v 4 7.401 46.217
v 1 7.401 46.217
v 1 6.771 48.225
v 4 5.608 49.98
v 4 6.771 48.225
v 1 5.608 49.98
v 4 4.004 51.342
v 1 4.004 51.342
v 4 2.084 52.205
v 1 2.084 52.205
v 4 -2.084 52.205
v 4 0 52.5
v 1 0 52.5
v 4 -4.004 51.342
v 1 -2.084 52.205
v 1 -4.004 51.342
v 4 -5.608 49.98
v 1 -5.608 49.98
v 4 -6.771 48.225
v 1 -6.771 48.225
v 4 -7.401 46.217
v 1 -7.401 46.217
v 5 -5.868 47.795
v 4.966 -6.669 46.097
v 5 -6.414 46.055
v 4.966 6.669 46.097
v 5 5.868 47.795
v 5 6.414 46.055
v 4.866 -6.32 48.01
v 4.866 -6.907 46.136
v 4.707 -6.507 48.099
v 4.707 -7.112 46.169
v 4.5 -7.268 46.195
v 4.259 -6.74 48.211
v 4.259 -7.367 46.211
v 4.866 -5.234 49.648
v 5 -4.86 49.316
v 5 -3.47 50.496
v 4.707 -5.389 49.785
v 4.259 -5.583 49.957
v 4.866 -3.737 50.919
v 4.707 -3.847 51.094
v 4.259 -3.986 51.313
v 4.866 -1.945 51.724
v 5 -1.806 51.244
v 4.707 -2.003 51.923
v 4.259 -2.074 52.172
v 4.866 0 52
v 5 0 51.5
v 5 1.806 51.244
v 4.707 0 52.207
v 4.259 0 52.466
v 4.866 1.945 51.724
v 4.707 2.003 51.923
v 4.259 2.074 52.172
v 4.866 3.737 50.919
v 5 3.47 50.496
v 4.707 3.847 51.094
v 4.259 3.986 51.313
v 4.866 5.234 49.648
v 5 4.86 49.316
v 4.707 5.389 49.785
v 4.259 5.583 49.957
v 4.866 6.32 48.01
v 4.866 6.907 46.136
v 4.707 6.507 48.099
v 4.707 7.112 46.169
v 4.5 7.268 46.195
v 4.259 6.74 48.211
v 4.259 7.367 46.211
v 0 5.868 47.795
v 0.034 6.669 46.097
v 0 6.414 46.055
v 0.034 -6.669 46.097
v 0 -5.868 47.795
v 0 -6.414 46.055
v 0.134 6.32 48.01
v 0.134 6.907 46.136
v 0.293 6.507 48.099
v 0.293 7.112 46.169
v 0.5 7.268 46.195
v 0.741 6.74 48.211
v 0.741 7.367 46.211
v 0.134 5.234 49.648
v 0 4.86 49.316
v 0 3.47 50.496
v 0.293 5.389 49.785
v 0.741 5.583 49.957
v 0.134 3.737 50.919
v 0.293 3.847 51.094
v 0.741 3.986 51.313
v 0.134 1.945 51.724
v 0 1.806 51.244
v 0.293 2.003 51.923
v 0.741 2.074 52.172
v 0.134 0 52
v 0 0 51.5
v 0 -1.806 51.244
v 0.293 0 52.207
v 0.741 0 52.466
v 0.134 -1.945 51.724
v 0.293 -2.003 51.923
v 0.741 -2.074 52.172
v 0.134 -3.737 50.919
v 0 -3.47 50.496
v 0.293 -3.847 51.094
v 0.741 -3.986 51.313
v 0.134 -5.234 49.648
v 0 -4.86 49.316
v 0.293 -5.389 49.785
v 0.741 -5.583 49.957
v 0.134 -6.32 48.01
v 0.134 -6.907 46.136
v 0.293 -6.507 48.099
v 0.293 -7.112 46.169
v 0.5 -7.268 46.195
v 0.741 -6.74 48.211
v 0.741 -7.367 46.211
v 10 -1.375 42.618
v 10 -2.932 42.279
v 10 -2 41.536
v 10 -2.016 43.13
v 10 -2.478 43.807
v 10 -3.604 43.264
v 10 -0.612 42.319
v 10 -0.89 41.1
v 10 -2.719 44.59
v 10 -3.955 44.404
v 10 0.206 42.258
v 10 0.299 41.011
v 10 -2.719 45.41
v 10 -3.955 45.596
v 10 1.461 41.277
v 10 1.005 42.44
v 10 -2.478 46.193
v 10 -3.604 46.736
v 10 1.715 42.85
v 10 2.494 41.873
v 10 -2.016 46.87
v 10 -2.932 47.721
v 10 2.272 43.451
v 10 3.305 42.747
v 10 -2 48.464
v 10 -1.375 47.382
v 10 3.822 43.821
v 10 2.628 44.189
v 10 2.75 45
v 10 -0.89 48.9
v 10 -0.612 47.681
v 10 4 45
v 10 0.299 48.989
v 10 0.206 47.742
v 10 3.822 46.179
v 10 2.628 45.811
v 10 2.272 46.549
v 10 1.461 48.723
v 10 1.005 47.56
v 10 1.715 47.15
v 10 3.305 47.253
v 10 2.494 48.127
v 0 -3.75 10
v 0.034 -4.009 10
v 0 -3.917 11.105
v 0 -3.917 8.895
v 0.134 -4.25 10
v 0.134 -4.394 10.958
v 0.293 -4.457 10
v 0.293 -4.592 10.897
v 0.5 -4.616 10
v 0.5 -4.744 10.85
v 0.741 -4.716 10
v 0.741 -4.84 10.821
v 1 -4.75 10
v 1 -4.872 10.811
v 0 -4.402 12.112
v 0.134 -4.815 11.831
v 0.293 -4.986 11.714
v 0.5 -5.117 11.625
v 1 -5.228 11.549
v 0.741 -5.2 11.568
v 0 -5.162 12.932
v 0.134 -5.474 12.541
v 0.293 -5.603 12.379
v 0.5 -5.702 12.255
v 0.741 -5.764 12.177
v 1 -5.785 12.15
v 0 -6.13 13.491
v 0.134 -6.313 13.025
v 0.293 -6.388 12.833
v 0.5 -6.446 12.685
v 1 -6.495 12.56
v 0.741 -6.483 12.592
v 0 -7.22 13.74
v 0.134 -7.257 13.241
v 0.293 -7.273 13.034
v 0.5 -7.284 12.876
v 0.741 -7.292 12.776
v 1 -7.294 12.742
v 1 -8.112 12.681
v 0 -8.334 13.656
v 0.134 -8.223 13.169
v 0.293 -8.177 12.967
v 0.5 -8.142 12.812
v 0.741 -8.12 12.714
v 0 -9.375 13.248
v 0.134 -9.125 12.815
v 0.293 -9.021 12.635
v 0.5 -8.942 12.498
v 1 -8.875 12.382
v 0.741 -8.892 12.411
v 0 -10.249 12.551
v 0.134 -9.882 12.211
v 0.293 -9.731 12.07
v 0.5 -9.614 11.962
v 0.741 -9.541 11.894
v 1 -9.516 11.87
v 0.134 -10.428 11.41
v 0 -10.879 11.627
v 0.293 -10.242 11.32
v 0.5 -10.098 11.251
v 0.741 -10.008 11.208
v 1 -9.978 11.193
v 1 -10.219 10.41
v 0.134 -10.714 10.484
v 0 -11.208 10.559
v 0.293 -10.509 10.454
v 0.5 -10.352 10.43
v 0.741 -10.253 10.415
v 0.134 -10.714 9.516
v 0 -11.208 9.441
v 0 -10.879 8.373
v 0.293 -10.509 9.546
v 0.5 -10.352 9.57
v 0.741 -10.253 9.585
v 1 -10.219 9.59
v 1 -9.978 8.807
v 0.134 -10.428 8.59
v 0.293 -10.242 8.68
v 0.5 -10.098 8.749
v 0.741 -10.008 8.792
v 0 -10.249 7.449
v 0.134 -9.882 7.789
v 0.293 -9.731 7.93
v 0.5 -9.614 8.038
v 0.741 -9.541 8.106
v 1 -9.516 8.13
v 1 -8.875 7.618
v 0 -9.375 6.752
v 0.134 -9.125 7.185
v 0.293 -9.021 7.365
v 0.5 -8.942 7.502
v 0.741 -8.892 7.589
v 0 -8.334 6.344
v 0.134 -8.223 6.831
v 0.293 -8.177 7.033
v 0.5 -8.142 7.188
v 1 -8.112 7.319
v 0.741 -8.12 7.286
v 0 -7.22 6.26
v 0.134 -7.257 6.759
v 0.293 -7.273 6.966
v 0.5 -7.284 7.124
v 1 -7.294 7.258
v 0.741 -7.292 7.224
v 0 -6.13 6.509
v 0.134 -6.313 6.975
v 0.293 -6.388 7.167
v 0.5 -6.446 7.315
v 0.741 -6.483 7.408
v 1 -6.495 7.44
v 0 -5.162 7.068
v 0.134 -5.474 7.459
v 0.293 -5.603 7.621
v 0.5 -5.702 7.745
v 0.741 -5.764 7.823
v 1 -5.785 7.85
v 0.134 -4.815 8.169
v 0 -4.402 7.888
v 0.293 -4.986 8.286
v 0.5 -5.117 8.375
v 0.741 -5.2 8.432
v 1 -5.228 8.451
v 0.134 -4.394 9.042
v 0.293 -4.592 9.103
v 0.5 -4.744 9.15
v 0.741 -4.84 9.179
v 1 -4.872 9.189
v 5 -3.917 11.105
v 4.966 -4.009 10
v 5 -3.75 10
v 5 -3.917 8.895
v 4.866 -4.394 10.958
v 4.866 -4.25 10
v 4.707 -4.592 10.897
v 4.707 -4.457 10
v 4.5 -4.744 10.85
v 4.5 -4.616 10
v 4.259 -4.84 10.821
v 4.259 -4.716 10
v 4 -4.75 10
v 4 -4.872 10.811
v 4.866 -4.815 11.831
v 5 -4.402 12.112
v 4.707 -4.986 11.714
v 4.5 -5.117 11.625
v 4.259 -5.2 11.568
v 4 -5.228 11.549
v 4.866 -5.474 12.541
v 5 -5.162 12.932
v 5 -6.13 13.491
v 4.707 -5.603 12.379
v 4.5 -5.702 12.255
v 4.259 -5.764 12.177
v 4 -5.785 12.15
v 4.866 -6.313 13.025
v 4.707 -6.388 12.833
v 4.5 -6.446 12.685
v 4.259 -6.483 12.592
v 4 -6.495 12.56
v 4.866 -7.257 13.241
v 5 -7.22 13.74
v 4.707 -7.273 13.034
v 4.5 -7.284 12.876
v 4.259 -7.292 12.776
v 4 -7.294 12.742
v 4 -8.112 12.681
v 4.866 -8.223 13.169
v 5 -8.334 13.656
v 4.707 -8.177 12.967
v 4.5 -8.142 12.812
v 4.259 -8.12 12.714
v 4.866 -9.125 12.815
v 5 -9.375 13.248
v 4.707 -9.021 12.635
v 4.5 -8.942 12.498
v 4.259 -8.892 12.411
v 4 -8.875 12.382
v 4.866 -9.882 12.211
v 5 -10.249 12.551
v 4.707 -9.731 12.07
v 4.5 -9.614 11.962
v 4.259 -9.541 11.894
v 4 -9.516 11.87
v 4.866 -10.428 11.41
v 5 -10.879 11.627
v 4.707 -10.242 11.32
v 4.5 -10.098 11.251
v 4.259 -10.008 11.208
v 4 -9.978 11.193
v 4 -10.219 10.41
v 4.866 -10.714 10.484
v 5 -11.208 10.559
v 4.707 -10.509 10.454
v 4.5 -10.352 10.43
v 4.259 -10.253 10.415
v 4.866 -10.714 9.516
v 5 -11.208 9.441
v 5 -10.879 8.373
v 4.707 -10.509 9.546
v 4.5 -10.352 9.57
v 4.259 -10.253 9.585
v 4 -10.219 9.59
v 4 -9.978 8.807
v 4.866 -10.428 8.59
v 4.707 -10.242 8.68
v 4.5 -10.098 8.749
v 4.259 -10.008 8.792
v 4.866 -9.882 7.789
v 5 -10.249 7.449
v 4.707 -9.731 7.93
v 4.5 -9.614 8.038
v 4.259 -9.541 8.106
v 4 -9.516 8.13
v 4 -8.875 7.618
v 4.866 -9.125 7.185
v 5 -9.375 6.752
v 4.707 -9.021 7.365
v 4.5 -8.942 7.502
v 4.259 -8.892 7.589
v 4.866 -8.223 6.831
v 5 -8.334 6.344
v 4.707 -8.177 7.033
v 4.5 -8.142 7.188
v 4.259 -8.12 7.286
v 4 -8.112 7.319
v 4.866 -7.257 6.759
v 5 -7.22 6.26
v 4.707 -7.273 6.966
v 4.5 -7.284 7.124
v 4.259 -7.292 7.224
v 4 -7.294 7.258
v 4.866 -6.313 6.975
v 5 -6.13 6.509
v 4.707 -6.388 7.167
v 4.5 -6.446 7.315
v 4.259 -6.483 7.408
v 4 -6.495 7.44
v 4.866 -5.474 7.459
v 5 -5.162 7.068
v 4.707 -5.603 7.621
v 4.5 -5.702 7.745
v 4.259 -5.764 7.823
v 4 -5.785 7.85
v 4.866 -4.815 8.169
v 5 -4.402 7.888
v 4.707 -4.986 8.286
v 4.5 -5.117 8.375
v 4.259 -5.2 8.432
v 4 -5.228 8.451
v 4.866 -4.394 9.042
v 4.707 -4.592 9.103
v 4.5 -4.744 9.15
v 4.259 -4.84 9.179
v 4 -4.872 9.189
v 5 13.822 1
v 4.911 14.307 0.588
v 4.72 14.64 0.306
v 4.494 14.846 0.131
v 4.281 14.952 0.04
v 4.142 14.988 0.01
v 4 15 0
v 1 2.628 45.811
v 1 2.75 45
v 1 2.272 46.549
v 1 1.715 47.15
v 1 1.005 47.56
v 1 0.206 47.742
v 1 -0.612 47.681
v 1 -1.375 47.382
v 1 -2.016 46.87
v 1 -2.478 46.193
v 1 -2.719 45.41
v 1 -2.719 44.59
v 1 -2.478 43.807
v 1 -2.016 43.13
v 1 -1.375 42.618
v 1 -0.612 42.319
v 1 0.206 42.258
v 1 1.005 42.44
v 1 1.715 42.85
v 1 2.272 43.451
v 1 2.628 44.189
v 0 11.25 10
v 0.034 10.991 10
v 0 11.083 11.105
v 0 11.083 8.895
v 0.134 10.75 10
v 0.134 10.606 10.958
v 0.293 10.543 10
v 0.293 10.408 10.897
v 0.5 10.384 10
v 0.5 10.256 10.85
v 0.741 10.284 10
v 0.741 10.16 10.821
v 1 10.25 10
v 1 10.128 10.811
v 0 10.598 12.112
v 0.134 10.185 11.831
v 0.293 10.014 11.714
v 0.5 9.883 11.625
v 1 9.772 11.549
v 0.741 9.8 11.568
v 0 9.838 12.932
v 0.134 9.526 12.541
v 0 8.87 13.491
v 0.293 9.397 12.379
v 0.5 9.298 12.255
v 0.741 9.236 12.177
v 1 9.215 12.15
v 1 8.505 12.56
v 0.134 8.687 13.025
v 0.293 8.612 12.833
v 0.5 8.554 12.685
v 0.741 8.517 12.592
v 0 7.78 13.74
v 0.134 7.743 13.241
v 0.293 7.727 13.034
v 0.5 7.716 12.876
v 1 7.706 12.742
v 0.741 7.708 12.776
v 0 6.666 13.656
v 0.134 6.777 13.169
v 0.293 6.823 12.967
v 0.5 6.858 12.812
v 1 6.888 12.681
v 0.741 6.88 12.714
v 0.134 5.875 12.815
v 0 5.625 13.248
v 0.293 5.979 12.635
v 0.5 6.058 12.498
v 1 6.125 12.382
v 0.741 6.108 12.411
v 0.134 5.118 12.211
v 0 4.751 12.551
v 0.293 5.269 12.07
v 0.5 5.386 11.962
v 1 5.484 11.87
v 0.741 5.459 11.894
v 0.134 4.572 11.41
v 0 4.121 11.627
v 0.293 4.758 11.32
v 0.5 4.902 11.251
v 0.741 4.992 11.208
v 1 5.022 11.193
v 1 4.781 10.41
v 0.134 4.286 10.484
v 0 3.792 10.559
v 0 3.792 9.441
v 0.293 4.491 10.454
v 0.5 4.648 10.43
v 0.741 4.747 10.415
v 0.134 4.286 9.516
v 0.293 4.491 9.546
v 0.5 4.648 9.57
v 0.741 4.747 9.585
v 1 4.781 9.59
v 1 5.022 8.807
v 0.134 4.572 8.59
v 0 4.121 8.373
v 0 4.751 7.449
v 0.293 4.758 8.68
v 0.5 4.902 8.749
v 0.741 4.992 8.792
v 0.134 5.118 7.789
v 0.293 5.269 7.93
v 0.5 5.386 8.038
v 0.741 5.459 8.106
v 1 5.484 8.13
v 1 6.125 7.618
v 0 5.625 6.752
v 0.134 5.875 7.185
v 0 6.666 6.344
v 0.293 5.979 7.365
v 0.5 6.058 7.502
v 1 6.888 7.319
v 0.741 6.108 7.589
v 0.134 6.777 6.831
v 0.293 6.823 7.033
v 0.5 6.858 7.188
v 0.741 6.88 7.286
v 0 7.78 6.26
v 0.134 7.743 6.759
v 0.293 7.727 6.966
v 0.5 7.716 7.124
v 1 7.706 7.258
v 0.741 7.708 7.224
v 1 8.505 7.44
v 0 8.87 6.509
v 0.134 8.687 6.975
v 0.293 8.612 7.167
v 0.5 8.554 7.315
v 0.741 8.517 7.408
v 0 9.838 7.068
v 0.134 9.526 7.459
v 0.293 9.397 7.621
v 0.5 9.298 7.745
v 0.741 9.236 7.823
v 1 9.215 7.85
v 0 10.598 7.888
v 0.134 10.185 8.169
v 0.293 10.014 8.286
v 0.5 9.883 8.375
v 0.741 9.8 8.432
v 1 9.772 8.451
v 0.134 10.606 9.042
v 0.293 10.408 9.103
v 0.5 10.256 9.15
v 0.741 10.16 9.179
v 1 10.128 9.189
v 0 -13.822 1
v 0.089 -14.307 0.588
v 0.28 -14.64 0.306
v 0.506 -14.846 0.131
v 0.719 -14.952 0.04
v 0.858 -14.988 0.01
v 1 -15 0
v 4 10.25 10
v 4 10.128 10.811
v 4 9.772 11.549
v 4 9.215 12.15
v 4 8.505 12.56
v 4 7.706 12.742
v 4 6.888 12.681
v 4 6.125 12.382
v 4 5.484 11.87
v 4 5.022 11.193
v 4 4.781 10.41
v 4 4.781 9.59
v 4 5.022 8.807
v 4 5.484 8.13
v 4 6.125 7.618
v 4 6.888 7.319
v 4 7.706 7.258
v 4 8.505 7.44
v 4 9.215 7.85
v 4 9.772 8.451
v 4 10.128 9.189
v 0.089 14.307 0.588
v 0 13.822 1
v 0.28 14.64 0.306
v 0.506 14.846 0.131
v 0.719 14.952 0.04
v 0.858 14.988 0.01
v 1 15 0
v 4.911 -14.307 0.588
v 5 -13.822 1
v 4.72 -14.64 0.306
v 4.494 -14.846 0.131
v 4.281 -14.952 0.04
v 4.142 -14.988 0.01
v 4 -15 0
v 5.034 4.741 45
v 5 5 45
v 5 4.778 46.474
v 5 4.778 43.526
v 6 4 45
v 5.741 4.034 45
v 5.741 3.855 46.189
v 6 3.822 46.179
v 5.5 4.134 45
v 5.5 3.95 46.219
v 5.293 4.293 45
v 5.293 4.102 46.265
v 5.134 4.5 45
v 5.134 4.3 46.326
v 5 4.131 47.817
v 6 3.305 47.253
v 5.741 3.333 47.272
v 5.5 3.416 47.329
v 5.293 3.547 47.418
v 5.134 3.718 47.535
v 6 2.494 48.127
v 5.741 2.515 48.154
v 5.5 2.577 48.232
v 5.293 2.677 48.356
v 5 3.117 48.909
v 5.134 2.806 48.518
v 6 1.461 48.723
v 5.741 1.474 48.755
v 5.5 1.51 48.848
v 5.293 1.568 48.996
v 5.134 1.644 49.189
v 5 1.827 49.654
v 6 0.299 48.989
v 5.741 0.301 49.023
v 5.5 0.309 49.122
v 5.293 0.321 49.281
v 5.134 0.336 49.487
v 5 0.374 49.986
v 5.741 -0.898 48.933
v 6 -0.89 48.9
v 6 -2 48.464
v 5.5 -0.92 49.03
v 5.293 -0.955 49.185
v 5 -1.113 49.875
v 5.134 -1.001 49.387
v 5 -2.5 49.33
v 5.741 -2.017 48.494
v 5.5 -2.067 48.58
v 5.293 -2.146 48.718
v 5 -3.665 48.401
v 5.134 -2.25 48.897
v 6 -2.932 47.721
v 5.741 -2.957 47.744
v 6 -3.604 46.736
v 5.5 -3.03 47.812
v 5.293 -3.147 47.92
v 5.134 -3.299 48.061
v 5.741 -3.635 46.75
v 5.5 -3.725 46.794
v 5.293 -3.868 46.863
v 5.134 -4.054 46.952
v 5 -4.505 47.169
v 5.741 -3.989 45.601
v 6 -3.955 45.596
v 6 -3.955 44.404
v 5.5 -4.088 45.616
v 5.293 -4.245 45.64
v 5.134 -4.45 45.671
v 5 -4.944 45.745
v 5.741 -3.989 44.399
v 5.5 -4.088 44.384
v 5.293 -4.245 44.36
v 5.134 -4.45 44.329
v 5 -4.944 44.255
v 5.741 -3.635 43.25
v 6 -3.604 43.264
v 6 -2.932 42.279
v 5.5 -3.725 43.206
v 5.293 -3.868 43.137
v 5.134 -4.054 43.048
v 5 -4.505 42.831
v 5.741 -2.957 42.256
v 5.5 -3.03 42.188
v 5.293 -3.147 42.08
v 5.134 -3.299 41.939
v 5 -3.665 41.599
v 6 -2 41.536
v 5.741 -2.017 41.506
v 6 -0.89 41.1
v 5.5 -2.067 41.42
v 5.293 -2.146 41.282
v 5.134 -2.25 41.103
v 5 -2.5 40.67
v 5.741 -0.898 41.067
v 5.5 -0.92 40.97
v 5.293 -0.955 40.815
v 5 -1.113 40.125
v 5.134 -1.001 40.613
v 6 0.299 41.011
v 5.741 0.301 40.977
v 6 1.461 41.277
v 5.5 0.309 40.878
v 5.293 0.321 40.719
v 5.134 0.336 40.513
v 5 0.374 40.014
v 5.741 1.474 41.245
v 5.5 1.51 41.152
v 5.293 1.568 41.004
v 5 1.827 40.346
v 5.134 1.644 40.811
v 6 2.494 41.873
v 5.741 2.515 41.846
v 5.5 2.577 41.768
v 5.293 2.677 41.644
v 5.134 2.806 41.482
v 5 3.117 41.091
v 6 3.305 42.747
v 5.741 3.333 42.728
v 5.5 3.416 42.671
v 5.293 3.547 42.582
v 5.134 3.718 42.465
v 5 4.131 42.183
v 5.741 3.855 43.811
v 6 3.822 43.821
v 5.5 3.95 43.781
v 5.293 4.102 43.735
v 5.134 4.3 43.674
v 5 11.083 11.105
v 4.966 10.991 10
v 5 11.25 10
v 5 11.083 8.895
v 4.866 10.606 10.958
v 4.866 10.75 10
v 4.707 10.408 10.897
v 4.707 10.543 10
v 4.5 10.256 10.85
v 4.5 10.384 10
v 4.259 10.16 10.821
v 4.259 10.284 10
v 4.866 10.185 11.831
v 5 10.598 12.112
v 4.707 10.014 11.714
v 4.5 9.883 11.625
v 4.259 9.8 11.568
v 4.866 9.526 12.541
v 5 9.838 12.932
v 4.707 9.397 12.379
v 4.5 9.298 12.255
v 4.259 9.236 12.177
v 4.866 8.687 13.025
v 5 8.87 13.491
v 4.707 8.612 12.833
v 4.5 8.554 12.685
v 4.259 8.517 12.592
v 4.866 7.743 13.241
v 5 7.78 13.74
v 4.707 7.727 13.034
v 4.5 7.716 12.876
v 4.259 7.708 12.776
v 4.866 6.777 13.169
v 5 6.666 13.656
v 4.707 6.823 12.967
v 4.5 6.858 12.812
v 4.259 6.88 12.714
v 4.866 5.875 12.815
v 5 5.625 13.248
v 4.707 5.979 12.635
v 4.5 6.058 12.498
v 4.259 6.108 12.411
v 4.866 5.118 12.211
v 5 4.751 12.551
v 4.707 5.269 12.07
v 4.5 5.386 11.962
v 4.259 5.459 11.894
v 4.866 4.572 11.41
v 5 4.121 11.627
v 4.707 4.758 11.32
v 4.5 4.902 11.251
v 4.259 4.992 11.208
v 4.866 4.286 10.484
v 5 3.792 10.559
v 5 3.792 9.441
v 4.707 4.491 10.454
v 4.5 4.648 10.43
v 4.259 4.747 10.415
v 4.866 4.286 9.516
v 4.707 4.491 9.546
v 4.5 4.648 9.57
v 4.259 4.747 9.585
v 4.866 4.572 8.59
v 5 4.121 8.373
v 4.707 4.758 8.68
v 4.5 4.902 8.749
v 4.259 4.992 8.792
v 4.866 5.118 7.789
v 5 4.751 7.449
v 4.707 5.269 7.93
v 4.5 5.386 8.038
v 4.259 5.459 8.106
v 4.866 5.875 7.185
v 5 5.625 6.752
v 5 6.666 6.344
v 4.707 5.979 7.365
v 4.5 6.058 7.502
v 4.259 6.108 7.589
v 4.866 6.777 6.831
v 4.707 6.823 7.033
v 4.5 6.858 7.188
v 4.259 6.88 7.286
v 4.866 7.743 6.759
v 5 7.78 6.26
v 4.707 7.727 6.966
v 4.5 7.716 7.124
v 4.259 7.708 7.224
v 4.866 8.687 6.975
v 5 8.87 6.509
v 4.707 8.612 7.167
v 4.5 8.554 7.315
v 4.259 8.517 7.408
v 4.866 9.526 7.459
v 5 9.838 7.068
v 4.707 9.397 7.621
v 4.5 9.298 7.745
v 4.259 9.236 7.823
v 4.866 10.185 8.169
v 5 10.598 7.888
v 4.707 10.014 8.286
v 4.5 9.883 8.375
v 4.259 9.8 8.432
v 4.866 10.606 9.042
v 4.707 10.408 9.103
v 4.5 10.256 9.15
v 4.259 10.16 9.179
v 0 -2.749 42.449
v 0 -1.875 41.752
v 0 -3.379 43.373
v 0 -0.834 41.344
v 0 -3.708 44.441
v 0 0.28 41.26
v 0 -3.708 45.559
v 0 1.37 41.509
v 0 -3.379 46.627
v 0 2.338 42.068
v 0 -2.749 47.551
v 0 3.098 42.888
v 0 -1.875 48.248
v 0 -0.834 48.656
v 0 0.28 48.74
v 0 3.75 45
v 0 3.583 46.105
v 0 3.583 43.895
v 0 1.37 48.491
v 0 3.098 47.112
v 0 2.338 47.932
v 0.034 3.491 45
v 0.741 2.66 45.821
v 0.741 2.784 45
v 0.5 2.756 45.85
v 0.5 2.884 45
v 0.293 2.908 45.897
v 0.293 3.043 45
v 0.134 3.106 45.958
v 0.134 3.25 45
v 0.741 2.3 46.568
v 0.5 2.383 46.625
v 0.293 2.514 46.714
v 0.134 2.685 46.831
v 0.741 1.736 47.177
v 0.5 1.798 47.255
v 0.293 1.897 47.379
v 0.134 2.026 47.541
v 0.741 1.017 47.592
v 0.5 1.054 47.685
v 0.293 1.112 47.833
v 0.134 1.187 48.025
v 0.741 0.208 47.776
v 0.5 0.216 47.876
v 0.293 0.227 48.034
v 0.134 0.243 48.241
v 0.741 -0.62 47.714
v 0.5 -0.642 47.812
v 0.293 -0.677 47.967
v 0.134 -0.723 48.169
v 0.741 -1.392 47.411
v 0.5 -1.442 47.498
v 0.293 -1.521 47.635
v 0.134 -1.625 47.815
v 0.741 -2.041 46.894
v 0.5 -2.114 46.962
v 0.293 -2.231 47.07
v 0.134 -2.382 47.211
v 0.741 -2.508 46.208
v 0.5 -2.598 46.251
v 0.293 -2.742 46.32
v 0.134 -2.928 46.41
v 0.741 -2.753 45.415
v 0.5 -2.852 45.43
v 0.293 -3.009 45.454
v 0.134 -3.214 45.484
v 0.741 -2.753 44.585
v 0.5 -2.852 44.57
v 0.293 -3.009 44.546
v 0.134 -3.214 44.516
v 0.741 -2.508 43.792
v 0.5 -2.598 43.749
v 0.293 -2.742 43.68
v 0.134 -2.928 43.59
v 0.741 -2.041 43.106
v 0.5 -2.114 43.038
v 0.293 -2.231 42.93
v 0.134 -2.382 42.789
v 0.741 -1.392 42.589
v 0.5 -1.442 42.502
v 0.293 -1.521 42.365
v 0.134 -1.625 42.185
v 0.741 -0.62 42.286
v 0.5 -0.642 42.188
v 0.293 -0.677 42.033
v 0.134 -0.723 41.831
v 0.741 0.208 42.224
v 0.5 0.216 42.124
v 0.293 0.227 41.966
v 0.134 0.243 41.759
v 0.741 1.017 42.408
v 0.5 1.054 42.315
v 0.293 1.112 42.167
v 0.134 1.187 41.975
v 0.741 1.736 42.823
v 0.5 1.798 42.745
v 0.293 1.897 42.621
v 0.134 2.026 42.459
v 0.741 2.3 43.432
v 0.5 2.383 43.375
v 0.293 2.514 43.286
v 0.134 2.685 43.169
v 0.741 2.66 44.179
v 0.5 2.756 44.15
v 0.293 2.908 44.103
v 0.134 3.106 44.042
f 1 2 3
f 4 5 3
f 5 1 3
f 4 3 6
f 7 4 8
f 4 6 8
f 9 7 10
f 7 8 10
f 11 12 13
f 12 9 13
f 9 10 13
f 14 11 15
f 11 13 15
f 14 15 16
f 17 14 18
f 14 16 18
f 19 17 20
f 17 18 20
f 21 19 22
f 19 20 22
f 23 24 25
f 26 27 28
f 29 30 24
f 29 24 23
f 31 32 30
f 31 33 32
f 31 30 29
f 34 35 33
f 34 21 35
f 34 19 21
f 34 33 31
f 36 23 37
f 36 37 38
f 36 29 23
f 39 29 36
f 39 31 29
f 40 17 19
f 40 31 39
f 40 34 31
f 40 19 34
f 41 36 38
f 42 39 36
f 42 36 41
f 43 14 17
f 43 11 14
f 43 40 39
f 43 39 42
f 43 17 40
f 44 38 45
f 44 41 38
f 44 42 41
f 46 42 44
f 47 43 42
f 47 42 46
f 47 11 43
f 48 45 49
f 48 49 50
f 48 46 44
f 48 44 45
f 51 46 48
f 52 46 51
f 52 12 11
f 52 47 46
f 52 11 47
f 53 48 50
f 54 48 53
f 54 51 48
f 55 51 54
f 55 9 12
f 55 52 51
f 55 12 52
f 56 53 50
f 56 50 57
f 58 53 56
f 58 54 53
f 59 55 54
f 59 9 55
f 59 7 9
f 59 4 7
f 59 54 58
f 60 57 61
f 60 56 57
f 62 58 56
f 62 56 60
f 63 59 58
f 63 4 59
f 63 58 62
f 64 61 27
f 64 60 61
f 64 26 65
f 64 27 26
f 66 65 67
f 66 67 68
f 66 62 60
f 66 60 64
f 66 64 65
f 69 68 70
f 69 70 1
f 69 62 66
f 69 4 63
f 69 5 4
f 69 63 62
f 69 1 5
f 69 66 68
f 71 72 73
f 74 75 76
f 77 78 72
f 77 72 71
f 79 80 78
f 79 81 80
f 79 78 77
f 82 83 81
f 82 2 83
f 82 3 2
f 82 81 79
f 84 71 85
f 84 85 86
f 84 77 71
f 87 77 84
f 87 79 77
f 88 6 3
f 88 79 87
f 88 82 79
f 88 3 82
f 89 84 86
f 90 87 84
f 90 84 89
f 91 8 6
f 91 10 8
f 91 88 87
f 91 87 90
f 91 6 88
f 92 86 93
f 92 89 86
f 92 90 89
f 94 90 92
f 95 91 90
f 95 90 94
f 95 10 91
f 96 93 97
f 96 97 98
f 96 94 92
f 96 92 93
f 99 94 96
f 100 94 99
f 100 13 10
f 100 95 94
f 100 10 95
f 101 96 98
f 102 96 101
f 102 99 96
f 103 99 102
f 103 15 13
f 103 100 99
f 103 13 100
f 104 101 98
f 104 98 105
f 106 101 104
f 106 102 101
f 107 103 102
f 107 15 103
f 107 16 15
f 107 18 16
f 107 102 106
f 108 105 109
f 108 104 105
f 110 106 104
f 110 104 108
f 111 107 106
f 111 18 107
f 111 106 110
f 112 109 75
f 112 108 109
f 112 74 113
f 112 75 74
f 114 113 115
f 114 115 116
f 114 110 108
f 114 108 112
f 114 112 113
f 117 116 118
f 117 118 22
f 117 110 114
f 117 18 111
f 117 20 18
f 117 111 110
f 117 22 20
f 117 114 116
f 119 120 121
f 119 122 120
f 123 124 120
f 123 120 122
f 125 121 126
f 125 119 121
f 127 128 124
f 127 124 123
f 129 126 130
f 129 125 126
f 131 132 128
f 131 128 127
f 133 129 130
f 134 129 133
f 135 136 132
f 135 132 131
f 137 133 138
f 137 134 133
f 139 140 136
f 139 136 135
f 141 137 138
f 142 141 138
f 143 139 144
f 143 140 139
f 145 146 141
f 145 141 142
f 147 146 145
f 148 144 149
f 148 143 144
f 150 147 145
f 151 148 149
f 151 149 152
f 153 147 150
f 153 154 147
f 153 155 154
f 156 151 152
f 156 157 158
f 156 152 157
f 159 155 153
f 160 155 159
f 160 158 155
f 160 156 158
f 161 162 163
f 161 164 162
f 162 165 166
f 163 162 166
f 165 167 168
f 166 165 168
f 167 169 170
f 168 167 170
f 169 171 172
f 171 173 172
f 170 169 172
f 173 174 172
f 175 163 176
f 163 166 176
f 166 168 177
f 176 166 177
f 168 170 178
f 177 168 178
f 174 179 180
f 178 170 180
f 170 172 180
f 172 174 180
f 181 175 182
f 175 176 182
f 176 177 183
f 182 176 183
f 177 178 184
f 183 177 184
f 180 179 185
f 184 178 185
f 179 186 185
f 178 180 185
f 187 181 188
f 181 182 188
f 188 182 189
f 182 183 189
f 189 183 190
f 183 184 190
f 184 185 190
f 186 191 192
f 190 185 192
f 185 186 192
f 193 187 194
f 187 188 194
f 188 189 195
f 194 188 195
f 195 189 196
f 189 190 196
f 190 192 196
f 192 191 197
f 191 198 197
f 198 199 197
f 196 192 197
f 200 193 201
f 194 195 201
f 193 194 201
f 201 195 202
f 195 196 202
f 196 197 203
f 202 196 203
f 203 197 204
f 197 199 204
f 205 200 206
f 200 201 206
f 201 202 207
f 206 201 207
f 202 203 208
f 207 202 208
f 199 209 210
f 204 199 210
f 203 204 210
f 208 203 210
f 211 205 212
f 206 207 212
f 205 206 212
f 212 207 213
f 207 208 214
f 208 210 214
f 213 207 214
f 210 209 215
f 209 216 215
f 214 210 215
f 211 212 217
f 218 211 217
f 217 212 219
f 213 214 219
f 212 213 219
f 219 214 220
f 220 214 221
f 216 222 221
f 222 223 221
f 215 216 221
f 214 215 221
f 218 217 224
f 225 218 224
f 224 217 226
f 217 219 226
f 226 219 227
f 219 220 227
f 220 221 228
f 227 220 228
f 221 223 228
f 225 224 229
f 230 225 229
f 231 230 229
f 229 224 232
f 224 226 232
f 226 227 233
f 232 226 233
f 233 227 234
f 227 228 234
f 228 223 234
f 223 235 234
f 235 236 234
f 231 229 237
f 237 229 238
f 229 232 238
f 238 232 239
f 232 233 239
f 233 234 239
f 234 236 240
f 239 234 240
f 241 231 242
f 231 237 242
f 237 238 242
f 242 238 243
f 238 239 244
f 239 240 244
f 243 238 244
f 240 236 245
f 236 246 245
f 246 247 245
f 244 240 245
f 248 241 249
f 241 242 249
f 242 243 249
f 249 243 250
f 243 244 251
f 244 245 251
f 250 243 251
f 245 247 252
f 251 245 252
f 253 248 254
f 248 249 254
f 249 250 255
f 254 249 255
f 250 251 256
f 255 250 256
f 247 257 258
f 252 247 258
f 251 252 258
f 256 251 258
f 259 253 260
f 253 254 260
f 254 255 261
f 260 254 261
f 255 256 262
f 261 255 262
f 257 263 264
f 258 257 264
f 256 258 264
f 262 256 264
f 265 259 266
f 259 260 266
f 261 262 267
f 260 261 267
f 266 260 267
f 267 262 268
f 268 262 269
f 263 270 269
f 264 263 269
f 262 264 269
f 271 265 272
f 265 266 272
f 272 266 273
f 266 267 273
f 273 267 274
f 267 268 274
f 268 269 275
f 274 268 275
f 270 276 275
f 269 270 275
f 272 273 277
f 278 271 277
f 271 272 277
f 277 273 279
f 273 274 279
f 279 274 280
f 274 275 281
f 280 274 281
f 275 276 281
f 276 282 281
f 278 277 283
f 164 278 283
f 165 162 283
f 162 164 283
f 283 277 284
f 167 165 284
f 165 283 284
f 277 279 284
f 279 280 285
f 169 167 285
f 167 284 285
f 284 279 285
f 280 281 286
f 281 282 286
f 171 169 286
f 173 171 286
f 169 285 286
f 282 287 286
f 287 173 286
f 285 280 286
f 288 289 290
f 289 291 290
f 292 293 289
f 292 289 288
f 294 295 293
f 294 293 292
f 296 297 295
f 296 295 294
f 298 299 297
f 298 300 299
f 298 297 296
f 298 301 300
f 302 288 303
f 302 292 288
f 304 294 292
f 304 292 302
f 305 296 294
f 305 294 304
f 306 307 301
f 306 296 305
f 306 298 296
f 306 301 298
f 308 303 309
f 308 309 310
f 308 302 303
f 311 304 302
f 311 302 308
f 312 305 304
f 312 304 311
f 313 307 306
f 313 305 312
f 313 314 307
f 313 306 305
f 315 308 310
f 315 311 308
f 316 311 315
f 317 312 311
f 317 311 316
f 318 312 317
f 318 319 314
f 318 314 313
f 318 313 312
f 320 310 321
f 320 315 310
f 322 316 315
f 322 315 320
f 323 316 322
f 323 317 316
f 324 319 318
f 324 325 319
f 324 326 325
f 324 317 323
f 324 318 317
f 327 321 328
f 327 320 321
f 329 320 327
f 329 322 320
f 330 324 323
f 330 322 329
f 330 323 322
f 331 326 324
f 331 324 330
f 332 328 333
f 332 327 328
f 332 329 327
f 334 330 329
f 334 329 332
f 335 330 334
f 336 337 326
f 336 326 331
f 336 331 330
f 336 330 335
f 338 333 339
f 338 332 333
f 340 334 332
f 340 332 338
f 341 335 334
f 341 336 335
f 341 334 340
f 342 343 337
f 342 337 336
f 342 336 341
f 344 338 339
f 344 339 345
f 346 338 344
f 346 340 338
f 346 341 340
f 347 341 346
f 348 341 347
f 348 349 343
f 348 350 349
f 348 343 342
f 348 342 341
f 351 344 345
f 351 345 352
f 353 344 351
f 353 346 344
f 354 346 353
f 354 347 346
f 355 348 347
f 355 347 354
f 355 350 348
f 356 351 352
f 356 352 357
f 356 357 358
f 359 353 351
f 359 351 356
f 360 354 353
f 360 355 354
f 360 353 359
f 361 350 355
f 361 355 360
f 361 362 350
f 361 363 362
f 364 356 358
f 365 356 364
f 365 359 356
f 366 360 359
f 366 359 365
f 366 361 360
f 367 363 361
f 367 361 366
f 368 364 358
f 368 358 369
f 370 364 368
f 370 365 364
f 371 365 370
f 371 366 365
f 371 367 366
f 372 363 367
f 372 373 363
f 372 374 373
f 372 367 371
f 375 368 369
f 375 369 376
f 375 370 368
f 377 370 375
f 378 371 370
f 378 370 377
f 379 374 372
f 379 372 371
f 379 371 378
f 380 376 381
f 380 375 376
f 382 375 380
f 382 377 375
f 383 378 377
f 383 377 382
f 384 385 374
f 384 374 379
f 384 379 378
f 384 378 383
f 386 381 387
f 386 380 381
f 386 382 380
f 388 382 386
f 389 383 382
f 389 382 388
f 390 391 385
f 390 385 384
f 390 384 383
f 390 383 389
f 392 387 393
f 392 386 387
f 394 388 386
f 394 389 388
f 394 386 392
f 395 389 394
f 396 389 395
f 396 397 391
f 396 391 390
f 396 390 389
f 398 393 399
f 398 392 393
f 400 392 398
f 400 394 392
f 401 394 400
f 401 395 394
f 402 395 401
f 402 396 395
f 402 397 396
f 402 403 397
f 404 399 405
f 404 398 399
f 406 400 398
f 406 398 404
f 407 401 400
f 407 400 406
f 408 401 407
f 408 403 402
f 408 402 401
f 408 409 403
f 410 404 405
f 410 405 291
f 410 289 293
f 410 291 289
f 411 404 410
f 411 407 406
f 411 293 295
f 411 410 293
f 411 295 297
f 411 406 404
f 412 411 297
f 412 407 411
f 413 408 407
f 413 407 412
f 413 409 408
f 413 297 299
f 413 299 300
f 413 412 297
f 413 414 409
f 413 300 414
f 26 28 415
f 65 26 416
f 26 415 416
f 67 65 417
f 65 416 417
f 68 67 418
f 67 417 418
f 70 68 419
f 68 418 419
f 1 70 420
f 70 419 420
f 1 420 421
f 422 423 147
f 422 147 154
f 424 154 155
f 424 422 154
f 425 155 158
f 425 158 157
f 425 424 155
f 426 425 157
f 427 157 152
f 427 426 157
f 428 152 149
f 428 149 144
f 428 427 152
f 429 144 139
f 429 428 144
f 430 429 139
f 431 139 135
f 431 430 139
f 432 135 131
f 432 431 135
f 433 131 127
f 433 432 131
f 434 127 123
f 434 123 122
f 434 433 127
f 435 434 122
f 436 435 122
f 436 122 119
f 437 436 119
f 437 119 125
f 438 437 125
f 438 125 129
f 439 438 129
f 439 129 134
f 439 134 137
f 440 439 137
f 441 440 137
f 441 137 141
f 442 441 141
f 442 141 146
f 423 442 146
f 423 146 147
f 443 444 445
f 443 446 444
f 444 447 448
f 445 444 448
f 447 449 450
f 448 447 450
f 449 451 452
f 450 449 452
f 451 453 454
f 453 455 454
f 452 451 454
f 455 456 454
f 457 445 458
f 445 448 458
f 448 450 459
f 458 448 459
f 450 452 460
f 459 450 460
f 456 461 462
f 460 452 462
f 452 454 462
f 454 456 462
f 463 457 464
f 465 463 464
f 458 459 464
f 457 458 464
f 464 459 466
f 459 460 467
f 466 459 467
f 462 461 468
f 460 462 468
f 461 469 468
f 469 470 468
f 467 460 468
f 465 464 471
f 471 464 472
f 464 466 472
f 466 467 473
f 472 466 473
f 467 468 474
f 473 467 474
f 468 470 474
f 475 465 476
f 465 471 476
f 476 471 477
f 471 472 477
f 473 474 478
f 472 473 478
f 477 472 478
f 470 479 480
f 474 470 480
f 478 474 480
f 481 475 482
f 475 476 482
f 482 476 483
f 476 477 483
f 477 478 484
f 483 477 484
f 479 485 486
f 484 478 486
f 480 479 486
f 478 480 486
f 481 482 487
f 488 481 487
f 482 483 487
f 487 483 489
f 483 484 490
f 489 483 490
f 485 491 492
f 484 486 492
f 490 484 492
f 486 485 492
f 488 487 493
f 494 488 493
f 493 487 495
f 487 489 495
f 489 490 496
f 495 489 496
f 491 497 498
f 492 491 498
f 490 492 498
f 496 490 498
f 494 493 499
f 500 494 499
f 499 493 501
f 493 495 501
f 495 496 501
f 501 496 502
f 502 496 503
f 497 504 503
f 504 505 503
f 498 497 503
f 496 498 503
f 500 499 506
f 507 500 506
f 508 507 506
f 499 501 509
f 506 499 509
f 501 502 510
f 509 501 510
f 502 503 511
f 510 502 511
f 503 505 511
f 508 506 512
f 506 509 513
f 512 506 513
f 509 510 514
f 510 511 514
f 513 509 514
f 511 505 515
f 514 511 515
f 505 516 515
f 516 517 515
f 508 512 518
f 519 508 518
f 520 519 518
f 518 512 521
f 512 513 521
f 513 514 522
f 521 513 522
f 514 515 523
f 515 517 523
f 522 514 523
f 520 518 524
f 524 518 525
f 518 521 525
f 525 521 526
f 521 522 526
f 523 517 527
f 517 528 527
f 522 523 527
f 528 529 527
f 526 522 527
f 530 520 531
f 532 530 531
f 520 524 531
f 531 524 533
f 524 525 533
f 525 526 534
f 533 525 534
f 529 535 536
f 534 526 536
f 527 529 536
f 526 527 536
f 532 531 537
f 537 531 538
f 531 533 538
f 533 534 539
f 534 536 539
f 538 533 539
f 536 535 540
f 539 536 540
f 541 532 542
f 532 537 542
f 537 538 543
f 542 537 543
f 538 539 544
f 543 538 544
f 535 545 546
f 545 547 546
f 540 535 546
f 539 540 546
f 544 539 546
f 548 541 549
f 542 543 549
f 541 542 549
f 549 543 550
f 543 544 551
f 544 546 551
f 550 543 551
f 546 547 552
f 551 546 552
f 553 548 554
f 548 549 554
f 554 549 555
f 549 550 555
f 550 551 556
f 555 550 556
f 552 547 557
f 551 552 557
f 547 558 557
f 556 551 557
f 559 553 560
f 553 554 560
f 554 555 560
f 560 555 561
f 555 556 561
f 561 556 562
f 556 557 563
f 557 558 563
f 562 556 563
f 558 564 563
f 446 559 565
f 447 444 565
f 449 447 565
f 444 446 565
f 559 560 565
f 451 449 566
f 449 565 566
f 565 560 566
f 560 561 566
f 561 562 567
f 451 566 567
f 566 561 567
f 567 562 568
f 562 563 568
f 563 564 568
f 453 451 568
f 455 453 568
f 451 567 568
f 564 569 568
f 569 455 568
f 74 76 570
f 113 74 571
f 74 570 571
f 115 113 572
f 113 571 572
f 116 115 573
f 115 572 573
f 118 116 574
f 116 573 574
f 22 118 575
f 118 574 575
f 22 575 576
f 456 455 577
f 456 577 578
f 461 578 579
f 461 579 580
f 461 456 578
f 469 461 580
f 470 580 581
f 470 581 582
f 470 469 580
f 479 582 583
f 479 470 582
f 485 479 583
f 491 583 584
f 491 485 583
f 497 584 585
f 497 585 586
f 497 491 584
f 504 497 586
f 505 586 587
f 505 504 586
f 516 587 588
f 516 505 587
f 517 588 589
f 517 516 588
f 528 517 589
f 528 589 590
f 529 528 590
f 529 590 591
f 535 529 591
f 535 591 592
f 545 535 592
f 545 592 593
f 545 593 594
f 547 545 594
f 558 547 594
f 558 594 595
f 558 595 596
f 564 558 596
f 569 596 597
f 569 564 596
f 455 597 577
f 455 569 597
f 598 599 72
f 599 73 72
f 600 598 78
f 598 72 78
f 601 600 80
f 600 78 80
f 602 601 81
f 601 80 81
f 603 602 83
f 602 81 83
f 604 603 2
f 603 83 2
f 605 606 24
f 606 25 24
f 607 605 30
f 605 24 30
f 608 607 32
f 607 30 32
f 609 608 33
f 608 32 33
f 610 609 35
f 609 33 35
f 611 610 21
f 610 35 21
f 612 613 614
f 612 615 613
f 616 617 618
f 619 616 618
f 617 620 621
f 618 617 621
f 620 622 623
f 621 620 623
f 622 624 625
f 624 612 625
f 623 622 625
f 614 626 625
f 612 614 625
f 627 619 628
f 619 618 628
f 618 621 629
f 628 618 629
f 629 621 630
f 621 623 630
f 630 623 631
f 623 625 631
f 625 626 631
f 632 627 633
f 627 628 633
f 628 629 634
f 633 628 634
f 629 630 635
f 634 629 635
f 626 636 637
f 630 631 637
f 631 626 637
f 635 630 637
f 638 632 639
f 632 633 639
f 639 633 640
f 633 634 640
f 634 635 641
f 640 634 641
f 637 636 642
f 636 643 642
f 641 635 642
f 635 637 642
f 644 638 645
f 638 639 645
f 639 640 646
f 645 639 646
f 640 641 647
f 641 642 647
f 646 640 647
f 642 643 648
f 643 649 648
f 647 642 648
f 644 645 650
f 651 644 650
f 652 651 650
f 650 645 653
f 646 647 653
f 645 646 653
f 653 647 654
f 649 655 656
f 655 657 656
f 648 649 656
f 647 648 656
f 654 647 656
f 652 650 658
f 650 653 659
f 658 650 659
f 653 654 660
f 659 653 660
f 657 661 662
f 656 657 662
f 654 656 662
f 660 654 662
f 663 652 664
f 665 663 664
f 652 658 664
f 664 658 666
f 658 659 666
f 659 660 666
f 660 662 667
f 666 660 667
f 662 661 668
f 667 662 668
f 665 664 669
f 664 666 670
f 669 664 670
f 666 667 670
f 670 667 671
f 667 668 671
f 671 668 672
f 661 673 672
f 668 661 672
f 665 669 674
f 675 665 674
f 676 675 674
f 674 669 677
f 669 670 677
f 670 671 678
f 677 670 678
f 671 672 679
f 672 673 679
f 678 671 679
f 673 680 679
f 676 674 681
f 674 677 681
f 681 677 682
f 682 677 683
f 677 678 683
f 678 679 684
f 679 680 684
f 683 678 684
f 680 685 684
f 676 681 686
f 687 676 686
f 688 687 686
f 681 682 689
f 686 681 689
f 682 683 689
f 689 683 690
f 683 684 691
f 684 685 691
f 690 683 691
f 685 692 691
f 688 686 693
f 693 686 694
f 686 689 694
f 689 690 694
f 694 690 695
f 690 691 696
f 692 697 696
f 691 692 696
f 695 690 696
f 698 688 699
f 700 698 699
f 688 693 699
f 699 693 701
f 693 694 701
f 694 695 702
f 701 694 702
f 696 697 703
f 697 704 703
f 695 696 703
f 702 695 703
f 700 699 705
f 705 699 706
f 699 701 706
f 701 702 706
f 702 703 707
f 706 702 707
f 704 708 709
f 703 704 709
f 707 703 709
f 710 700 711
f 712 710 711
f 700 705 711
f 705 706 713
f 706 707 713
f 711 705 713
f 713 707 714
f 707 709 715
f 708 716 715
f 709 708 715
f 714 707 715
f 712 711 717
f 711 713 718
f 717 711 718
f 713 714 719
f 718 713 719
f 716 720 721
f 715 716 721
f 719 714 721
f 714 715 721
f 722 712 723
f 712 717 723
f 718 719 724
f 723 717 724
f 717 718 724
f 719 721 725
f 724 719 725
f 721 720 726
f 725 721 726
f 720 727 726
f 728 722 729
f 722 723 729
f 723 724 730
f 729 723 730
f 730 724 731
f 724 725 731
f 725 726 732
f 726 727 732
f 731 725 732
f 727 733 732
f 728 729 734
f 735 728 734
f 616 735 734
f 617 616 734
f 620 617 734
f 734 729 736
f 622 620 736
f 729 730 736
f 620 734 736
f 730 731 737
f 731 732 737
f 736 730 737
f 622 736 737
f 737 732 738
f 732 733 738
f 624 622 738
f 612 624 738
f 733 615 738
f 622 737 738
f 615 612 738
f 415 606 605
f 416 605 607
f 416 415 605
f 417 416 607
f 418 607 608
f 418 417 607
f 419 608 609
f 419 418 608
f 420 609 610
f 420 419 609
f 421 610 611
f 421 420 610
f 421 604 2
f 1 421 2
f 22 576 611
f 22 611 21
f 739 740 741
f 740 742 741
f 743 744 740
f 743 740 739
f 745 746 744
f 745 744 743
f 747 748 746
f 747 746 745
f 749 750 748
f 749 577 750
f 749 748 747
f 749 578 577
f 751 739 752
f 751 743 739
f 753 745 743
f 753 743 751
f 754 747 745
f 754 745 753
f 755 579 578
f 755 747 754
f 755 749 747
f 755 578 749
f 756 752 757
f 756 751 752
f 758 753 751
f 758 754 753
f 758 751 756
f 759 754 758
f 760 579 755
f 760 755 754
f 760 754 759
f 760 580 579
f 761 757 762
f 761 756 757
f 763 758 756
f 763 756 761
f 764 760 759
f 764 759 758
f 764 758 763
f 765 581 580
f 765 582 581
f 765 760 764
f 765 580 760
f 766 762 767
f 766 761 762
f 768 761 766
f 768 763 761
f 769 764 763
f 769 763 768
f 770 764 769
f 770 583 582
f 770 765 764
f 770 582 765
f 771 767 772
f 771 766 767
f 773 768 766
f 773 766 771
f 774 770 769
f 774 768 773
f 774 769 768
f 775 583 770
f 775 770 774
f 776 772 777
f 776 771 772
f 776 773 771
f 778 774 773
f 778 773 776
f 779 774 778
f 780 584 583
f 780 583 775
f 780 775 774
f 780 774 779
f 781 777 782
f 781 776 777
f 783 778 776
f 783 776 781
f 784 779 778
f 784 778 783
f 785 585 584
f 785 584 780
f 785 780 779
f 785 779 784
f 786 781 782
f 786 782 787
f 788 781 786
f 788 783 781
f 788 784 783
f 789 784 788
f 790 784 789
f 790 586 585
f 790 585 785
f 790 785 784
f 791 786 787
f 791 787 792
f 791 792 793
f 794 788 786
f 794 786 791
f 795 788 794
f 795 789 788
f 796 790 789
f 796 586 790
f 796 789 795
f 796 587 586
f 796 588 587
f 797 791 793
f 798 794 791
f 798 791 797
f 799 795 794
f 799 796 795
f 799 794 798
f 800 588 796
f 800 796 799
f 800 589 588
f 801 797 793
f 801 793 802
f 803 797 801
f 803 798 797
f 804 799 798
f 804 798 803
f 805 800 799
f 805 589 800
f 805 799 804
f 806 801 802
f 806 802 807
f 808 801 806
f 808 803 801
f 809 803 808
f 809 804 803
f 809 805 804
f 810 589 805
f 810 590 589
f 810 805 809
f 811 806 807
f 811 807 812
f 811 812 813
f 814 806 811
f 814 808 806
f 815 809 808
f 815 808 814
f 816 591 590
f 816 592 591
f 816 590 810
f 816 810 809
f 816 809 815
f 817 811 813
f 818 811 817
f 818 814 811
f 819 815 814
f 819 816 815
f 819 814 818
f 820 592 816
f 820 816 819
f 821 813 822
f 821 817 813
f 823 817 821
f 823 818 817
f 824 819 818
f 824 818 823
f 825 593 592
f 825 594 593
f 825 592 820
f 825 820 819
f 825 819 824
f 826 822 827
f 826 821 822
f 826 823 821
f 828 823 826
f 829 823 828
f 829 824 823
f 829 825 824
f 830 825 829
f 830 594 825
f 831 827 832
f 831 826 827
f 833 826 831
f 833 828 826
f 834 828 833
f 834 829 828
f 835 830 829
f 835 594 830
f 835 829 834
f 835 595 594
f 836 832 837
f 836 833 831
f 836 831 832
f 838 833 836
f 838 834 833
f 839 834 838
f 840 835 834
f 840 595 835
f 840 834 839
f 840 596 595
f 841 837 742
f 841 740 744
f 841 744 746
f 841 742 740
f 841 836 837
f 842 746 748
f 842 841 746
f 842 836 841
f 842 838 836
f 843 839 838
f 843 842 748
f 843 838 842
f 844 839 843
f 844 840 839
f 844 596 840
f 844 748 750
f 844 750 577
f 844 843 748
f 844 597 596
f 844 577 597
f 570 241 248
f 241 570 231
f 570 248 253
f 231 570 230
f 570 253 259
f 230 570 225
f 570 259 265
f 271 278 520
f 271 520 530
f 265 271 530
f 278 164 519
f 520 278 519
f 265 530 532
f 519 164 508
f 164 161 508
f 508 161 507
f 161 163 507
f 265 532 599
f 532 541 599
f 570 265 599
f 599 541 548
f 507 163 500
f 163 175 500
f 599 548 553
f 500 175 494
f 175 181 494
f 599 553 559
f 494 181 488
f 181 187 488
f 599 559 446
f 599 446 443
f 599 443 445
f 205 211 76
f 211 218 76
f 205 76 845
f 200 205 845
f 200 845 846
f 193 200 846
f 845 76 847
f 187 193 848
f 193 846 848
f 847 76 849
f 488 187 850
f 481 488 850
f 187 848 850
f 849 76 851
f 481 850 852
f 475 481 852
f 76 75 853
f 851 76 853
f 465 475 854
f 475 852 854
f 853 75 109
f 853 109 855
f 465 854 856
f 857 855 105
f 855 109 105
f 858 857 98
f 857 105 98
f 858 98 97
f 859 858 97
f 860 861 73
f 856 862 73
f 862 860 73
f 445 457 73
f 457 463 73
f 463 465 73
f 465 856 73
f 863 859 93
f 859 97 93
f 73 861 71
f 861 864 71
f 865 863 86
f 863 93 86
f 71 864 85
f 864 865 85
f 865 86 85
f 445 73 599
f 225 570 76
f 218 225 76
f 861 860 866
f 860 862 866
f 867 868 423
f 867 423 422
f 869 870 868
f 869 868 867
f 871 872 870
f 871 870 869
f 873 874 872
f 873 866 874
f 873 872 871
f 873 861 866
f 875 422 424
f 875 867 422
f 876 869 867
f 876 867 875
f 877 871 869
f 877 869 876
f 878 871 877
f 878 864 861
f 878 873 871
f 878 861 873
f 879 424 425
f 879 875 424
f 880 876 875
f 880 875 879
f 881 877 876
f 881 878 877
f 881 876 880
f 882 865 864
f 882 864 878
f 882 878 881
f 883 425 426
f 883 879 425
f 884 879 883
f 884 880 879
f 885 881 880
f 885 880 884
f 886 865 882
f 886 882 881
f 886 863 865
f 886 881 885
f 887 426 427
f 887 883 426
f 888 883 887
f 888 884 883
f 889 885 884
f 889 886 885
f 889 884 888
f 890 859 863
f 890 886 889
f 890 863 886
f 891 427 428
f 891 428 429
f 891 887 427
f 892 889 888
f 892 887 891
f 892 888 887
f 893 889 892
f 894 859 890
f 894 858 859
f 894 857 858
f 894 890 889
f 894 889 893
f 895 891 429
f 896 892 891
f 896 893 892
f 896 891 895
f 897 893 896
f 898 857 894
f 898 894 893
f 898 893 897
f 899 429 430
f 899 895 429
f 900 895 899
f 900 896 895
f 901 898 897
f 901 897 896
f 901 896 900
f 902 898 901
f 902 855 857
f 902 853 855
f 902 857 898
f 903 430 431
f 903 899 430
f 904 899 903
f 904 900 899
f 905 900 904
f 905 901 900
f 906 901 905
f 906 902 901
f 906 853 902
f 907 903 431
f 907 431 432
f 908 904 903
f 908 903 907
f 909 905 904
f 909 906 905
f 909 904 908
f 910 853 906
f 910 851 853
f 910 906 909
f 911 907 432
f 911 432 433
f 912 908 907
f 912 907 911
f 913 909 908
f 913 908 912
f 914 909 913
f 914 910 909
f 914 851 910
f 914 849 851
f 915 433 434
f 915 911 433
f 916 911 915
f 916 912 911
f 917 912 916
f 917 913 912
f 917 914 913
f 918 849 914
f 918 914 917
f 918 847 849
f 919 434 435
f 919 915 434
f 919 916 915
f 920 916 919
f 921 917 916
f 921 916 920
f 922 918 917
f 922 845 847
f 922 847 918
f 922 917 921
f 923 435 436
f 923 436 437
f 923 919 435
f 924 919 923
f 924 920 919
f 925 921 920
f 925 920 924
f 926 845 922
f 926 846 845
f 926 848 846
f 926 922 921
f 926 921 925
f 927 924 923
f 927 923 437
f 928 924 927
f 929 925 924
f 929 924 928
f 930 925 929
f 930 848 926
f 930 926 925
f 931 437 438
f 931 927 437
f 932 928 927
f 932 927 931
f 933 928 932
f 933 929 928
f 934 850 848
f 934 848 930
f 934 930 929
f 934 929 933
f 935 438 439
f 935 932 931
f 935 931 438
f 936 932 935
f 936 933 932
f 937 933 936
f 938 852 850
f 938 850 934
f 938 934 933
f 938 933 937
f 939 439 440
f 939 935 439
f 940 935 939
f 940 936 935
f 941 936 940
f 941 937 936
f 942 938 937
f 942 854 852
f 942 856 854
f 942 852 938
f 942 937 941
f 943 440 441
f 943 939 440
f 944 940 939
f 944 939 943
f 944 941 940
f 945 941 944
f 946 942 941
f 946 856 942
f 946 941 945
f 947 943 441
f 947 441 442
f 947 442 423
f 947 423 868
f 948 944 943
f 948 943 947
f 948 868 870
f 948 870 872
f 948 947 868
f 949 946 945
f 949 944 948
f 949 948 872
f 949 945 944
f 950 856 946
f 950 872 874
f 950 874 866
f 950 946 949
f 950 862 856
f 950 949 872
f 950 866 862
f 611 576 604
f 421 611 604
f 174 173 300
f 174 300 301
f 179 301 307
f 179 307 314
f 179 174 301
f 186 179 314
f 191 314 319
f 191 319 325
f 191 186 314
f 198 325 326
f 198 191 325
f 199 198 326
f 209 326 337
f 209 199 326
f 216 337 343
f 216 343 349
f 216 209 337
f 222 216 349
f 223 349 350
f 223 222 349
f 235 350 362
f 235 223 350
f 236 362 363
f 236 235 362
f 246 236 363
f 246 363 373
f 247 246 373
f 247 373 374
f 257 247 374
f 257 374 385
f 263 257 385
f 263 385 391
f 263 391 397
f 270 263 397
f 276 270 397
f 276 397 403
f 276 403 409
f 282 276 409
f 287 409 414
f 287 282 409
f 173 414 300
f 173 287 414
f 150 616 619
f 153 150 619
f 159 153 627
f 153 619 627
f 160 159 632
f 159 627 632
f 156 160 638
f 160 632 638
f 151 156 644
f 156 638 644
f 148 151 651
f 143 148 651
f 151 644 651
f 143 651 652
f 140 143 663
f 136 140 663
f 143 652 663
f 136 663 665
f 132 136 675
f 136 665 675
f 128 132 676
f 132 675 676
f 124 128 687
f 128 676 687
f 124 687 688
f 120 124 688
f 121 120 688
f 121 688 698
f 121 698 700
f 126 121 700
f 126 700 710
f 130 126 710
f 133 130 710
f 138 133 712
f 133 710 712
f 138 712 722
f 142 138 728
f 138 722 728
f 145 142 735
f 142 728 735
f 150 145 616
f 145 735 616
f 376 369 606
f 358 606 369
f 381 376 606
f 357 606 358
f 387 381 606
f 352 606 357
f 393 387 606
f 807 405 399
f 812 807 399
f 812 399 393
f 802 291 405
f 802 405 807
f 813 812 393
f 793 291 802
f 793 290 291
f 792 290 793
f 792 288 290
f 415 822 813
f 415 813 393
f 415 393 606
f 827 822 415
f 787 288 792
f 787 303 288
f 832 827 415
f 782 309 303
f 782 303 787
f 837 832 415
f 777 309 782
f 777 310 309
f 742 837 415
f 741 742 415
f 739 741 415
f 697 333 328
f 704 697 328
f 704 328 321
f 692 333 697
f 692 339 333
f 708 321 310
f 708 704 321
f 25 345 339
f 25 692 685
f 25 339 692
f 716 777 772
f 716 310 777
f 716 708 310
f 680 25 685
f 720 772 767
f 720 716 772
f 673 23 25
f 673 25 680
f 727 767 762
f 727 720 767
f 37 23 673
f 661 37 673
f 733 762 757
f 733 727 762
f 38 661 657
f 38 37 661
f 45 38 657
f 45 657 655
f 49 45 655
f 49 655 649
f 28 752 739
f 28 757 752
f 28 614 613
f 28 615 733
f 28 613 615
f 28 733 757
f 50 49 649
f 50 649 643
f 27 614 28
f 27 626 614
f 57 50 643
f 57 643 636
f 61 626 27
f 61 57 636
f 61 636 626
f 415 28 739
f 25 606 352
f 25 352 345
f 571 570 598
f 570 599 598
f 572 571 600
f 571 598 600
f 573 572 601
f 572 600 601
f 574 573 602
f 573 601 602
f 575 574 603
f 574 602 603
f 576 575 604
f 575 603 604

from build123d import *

# Parameters (mm, degrees)
SKETCH_R      = 2.75
PAD_DEPTH     = 5
SKETCH001_R   = 4
SKETCH001_R_2 = 2.75
PAD001_DEPTH  = 5
FILLET_R      = 1
FILLET001_R   = 1


with BuildPart() as part:
    # Sketch → Pad (new body)
    with BuildSketch(Plane.YZ):
        with BuildLine():
            Line((-15, 0), (15, 0))
            Line((15, 0), (7.400623, 46.216874))
            ThreePointArc((7.400623, 46.216874), (0, 52.5), (-7.400623, 46.216874))
            Line((-15, 0), (-7.400623, 46.216874))
        make_face()
        with Locations((0, 45)):
            Circle(SKETCH_R, mode=Mode.SUBTRACT)
        with Locations((-7.5, 10)):
            Circle(SKETCH_R, mode=Mode.SUBTRACT)
        with Locations((7.5, 10)):
            Circle(SKETCH_R, mode=Mode.SUBTRACT)
    extrude(amount=PAD_DEPTH)

    # Sketch001 (on Face9 of Pad) → Pad001 (join)
    with BuildSketch(Plane.YZ.offset(5)):
        with Locations((0, 45)):
            Circle(SKETCH001_R)
        with Locations((0, 45)):
            Circle(SKETCH001_R_2, mode=Mode.SUBTRACT)
    extrude(amount=PAD001_DEPTH)

    # Fillet
    fillet_edges = [part.edges().sort_by_distance(p)[0] for p in [
        (0, 0, 0),
        (0, 11.200311, 23.108437),
        (0, 0, 52.5),
        (0, -11.200311, 23.108437),
        (0, -2.75, 45),
        (0, -10.25, 10),
        (0, 4.75, 10),
    ]]
    fillet(fillet_edges, radius=FILLET_R)

    # Fillet001
    fillet001_edges = [part.edges().sort_by_distance(p)[0] for p in [
        (5, 0, 0),
        (5, -11.200311, 23.108437),
        (5, 11.200311, 23.108437),
        (5, 0, 52.5),
        (5, 4.75, 10),
        (5, -10.25, 10),
        (5, -4, 45),
    ]]
    fillet(fillet001_edges, radius=FILLET001_R)


solid = part.part
